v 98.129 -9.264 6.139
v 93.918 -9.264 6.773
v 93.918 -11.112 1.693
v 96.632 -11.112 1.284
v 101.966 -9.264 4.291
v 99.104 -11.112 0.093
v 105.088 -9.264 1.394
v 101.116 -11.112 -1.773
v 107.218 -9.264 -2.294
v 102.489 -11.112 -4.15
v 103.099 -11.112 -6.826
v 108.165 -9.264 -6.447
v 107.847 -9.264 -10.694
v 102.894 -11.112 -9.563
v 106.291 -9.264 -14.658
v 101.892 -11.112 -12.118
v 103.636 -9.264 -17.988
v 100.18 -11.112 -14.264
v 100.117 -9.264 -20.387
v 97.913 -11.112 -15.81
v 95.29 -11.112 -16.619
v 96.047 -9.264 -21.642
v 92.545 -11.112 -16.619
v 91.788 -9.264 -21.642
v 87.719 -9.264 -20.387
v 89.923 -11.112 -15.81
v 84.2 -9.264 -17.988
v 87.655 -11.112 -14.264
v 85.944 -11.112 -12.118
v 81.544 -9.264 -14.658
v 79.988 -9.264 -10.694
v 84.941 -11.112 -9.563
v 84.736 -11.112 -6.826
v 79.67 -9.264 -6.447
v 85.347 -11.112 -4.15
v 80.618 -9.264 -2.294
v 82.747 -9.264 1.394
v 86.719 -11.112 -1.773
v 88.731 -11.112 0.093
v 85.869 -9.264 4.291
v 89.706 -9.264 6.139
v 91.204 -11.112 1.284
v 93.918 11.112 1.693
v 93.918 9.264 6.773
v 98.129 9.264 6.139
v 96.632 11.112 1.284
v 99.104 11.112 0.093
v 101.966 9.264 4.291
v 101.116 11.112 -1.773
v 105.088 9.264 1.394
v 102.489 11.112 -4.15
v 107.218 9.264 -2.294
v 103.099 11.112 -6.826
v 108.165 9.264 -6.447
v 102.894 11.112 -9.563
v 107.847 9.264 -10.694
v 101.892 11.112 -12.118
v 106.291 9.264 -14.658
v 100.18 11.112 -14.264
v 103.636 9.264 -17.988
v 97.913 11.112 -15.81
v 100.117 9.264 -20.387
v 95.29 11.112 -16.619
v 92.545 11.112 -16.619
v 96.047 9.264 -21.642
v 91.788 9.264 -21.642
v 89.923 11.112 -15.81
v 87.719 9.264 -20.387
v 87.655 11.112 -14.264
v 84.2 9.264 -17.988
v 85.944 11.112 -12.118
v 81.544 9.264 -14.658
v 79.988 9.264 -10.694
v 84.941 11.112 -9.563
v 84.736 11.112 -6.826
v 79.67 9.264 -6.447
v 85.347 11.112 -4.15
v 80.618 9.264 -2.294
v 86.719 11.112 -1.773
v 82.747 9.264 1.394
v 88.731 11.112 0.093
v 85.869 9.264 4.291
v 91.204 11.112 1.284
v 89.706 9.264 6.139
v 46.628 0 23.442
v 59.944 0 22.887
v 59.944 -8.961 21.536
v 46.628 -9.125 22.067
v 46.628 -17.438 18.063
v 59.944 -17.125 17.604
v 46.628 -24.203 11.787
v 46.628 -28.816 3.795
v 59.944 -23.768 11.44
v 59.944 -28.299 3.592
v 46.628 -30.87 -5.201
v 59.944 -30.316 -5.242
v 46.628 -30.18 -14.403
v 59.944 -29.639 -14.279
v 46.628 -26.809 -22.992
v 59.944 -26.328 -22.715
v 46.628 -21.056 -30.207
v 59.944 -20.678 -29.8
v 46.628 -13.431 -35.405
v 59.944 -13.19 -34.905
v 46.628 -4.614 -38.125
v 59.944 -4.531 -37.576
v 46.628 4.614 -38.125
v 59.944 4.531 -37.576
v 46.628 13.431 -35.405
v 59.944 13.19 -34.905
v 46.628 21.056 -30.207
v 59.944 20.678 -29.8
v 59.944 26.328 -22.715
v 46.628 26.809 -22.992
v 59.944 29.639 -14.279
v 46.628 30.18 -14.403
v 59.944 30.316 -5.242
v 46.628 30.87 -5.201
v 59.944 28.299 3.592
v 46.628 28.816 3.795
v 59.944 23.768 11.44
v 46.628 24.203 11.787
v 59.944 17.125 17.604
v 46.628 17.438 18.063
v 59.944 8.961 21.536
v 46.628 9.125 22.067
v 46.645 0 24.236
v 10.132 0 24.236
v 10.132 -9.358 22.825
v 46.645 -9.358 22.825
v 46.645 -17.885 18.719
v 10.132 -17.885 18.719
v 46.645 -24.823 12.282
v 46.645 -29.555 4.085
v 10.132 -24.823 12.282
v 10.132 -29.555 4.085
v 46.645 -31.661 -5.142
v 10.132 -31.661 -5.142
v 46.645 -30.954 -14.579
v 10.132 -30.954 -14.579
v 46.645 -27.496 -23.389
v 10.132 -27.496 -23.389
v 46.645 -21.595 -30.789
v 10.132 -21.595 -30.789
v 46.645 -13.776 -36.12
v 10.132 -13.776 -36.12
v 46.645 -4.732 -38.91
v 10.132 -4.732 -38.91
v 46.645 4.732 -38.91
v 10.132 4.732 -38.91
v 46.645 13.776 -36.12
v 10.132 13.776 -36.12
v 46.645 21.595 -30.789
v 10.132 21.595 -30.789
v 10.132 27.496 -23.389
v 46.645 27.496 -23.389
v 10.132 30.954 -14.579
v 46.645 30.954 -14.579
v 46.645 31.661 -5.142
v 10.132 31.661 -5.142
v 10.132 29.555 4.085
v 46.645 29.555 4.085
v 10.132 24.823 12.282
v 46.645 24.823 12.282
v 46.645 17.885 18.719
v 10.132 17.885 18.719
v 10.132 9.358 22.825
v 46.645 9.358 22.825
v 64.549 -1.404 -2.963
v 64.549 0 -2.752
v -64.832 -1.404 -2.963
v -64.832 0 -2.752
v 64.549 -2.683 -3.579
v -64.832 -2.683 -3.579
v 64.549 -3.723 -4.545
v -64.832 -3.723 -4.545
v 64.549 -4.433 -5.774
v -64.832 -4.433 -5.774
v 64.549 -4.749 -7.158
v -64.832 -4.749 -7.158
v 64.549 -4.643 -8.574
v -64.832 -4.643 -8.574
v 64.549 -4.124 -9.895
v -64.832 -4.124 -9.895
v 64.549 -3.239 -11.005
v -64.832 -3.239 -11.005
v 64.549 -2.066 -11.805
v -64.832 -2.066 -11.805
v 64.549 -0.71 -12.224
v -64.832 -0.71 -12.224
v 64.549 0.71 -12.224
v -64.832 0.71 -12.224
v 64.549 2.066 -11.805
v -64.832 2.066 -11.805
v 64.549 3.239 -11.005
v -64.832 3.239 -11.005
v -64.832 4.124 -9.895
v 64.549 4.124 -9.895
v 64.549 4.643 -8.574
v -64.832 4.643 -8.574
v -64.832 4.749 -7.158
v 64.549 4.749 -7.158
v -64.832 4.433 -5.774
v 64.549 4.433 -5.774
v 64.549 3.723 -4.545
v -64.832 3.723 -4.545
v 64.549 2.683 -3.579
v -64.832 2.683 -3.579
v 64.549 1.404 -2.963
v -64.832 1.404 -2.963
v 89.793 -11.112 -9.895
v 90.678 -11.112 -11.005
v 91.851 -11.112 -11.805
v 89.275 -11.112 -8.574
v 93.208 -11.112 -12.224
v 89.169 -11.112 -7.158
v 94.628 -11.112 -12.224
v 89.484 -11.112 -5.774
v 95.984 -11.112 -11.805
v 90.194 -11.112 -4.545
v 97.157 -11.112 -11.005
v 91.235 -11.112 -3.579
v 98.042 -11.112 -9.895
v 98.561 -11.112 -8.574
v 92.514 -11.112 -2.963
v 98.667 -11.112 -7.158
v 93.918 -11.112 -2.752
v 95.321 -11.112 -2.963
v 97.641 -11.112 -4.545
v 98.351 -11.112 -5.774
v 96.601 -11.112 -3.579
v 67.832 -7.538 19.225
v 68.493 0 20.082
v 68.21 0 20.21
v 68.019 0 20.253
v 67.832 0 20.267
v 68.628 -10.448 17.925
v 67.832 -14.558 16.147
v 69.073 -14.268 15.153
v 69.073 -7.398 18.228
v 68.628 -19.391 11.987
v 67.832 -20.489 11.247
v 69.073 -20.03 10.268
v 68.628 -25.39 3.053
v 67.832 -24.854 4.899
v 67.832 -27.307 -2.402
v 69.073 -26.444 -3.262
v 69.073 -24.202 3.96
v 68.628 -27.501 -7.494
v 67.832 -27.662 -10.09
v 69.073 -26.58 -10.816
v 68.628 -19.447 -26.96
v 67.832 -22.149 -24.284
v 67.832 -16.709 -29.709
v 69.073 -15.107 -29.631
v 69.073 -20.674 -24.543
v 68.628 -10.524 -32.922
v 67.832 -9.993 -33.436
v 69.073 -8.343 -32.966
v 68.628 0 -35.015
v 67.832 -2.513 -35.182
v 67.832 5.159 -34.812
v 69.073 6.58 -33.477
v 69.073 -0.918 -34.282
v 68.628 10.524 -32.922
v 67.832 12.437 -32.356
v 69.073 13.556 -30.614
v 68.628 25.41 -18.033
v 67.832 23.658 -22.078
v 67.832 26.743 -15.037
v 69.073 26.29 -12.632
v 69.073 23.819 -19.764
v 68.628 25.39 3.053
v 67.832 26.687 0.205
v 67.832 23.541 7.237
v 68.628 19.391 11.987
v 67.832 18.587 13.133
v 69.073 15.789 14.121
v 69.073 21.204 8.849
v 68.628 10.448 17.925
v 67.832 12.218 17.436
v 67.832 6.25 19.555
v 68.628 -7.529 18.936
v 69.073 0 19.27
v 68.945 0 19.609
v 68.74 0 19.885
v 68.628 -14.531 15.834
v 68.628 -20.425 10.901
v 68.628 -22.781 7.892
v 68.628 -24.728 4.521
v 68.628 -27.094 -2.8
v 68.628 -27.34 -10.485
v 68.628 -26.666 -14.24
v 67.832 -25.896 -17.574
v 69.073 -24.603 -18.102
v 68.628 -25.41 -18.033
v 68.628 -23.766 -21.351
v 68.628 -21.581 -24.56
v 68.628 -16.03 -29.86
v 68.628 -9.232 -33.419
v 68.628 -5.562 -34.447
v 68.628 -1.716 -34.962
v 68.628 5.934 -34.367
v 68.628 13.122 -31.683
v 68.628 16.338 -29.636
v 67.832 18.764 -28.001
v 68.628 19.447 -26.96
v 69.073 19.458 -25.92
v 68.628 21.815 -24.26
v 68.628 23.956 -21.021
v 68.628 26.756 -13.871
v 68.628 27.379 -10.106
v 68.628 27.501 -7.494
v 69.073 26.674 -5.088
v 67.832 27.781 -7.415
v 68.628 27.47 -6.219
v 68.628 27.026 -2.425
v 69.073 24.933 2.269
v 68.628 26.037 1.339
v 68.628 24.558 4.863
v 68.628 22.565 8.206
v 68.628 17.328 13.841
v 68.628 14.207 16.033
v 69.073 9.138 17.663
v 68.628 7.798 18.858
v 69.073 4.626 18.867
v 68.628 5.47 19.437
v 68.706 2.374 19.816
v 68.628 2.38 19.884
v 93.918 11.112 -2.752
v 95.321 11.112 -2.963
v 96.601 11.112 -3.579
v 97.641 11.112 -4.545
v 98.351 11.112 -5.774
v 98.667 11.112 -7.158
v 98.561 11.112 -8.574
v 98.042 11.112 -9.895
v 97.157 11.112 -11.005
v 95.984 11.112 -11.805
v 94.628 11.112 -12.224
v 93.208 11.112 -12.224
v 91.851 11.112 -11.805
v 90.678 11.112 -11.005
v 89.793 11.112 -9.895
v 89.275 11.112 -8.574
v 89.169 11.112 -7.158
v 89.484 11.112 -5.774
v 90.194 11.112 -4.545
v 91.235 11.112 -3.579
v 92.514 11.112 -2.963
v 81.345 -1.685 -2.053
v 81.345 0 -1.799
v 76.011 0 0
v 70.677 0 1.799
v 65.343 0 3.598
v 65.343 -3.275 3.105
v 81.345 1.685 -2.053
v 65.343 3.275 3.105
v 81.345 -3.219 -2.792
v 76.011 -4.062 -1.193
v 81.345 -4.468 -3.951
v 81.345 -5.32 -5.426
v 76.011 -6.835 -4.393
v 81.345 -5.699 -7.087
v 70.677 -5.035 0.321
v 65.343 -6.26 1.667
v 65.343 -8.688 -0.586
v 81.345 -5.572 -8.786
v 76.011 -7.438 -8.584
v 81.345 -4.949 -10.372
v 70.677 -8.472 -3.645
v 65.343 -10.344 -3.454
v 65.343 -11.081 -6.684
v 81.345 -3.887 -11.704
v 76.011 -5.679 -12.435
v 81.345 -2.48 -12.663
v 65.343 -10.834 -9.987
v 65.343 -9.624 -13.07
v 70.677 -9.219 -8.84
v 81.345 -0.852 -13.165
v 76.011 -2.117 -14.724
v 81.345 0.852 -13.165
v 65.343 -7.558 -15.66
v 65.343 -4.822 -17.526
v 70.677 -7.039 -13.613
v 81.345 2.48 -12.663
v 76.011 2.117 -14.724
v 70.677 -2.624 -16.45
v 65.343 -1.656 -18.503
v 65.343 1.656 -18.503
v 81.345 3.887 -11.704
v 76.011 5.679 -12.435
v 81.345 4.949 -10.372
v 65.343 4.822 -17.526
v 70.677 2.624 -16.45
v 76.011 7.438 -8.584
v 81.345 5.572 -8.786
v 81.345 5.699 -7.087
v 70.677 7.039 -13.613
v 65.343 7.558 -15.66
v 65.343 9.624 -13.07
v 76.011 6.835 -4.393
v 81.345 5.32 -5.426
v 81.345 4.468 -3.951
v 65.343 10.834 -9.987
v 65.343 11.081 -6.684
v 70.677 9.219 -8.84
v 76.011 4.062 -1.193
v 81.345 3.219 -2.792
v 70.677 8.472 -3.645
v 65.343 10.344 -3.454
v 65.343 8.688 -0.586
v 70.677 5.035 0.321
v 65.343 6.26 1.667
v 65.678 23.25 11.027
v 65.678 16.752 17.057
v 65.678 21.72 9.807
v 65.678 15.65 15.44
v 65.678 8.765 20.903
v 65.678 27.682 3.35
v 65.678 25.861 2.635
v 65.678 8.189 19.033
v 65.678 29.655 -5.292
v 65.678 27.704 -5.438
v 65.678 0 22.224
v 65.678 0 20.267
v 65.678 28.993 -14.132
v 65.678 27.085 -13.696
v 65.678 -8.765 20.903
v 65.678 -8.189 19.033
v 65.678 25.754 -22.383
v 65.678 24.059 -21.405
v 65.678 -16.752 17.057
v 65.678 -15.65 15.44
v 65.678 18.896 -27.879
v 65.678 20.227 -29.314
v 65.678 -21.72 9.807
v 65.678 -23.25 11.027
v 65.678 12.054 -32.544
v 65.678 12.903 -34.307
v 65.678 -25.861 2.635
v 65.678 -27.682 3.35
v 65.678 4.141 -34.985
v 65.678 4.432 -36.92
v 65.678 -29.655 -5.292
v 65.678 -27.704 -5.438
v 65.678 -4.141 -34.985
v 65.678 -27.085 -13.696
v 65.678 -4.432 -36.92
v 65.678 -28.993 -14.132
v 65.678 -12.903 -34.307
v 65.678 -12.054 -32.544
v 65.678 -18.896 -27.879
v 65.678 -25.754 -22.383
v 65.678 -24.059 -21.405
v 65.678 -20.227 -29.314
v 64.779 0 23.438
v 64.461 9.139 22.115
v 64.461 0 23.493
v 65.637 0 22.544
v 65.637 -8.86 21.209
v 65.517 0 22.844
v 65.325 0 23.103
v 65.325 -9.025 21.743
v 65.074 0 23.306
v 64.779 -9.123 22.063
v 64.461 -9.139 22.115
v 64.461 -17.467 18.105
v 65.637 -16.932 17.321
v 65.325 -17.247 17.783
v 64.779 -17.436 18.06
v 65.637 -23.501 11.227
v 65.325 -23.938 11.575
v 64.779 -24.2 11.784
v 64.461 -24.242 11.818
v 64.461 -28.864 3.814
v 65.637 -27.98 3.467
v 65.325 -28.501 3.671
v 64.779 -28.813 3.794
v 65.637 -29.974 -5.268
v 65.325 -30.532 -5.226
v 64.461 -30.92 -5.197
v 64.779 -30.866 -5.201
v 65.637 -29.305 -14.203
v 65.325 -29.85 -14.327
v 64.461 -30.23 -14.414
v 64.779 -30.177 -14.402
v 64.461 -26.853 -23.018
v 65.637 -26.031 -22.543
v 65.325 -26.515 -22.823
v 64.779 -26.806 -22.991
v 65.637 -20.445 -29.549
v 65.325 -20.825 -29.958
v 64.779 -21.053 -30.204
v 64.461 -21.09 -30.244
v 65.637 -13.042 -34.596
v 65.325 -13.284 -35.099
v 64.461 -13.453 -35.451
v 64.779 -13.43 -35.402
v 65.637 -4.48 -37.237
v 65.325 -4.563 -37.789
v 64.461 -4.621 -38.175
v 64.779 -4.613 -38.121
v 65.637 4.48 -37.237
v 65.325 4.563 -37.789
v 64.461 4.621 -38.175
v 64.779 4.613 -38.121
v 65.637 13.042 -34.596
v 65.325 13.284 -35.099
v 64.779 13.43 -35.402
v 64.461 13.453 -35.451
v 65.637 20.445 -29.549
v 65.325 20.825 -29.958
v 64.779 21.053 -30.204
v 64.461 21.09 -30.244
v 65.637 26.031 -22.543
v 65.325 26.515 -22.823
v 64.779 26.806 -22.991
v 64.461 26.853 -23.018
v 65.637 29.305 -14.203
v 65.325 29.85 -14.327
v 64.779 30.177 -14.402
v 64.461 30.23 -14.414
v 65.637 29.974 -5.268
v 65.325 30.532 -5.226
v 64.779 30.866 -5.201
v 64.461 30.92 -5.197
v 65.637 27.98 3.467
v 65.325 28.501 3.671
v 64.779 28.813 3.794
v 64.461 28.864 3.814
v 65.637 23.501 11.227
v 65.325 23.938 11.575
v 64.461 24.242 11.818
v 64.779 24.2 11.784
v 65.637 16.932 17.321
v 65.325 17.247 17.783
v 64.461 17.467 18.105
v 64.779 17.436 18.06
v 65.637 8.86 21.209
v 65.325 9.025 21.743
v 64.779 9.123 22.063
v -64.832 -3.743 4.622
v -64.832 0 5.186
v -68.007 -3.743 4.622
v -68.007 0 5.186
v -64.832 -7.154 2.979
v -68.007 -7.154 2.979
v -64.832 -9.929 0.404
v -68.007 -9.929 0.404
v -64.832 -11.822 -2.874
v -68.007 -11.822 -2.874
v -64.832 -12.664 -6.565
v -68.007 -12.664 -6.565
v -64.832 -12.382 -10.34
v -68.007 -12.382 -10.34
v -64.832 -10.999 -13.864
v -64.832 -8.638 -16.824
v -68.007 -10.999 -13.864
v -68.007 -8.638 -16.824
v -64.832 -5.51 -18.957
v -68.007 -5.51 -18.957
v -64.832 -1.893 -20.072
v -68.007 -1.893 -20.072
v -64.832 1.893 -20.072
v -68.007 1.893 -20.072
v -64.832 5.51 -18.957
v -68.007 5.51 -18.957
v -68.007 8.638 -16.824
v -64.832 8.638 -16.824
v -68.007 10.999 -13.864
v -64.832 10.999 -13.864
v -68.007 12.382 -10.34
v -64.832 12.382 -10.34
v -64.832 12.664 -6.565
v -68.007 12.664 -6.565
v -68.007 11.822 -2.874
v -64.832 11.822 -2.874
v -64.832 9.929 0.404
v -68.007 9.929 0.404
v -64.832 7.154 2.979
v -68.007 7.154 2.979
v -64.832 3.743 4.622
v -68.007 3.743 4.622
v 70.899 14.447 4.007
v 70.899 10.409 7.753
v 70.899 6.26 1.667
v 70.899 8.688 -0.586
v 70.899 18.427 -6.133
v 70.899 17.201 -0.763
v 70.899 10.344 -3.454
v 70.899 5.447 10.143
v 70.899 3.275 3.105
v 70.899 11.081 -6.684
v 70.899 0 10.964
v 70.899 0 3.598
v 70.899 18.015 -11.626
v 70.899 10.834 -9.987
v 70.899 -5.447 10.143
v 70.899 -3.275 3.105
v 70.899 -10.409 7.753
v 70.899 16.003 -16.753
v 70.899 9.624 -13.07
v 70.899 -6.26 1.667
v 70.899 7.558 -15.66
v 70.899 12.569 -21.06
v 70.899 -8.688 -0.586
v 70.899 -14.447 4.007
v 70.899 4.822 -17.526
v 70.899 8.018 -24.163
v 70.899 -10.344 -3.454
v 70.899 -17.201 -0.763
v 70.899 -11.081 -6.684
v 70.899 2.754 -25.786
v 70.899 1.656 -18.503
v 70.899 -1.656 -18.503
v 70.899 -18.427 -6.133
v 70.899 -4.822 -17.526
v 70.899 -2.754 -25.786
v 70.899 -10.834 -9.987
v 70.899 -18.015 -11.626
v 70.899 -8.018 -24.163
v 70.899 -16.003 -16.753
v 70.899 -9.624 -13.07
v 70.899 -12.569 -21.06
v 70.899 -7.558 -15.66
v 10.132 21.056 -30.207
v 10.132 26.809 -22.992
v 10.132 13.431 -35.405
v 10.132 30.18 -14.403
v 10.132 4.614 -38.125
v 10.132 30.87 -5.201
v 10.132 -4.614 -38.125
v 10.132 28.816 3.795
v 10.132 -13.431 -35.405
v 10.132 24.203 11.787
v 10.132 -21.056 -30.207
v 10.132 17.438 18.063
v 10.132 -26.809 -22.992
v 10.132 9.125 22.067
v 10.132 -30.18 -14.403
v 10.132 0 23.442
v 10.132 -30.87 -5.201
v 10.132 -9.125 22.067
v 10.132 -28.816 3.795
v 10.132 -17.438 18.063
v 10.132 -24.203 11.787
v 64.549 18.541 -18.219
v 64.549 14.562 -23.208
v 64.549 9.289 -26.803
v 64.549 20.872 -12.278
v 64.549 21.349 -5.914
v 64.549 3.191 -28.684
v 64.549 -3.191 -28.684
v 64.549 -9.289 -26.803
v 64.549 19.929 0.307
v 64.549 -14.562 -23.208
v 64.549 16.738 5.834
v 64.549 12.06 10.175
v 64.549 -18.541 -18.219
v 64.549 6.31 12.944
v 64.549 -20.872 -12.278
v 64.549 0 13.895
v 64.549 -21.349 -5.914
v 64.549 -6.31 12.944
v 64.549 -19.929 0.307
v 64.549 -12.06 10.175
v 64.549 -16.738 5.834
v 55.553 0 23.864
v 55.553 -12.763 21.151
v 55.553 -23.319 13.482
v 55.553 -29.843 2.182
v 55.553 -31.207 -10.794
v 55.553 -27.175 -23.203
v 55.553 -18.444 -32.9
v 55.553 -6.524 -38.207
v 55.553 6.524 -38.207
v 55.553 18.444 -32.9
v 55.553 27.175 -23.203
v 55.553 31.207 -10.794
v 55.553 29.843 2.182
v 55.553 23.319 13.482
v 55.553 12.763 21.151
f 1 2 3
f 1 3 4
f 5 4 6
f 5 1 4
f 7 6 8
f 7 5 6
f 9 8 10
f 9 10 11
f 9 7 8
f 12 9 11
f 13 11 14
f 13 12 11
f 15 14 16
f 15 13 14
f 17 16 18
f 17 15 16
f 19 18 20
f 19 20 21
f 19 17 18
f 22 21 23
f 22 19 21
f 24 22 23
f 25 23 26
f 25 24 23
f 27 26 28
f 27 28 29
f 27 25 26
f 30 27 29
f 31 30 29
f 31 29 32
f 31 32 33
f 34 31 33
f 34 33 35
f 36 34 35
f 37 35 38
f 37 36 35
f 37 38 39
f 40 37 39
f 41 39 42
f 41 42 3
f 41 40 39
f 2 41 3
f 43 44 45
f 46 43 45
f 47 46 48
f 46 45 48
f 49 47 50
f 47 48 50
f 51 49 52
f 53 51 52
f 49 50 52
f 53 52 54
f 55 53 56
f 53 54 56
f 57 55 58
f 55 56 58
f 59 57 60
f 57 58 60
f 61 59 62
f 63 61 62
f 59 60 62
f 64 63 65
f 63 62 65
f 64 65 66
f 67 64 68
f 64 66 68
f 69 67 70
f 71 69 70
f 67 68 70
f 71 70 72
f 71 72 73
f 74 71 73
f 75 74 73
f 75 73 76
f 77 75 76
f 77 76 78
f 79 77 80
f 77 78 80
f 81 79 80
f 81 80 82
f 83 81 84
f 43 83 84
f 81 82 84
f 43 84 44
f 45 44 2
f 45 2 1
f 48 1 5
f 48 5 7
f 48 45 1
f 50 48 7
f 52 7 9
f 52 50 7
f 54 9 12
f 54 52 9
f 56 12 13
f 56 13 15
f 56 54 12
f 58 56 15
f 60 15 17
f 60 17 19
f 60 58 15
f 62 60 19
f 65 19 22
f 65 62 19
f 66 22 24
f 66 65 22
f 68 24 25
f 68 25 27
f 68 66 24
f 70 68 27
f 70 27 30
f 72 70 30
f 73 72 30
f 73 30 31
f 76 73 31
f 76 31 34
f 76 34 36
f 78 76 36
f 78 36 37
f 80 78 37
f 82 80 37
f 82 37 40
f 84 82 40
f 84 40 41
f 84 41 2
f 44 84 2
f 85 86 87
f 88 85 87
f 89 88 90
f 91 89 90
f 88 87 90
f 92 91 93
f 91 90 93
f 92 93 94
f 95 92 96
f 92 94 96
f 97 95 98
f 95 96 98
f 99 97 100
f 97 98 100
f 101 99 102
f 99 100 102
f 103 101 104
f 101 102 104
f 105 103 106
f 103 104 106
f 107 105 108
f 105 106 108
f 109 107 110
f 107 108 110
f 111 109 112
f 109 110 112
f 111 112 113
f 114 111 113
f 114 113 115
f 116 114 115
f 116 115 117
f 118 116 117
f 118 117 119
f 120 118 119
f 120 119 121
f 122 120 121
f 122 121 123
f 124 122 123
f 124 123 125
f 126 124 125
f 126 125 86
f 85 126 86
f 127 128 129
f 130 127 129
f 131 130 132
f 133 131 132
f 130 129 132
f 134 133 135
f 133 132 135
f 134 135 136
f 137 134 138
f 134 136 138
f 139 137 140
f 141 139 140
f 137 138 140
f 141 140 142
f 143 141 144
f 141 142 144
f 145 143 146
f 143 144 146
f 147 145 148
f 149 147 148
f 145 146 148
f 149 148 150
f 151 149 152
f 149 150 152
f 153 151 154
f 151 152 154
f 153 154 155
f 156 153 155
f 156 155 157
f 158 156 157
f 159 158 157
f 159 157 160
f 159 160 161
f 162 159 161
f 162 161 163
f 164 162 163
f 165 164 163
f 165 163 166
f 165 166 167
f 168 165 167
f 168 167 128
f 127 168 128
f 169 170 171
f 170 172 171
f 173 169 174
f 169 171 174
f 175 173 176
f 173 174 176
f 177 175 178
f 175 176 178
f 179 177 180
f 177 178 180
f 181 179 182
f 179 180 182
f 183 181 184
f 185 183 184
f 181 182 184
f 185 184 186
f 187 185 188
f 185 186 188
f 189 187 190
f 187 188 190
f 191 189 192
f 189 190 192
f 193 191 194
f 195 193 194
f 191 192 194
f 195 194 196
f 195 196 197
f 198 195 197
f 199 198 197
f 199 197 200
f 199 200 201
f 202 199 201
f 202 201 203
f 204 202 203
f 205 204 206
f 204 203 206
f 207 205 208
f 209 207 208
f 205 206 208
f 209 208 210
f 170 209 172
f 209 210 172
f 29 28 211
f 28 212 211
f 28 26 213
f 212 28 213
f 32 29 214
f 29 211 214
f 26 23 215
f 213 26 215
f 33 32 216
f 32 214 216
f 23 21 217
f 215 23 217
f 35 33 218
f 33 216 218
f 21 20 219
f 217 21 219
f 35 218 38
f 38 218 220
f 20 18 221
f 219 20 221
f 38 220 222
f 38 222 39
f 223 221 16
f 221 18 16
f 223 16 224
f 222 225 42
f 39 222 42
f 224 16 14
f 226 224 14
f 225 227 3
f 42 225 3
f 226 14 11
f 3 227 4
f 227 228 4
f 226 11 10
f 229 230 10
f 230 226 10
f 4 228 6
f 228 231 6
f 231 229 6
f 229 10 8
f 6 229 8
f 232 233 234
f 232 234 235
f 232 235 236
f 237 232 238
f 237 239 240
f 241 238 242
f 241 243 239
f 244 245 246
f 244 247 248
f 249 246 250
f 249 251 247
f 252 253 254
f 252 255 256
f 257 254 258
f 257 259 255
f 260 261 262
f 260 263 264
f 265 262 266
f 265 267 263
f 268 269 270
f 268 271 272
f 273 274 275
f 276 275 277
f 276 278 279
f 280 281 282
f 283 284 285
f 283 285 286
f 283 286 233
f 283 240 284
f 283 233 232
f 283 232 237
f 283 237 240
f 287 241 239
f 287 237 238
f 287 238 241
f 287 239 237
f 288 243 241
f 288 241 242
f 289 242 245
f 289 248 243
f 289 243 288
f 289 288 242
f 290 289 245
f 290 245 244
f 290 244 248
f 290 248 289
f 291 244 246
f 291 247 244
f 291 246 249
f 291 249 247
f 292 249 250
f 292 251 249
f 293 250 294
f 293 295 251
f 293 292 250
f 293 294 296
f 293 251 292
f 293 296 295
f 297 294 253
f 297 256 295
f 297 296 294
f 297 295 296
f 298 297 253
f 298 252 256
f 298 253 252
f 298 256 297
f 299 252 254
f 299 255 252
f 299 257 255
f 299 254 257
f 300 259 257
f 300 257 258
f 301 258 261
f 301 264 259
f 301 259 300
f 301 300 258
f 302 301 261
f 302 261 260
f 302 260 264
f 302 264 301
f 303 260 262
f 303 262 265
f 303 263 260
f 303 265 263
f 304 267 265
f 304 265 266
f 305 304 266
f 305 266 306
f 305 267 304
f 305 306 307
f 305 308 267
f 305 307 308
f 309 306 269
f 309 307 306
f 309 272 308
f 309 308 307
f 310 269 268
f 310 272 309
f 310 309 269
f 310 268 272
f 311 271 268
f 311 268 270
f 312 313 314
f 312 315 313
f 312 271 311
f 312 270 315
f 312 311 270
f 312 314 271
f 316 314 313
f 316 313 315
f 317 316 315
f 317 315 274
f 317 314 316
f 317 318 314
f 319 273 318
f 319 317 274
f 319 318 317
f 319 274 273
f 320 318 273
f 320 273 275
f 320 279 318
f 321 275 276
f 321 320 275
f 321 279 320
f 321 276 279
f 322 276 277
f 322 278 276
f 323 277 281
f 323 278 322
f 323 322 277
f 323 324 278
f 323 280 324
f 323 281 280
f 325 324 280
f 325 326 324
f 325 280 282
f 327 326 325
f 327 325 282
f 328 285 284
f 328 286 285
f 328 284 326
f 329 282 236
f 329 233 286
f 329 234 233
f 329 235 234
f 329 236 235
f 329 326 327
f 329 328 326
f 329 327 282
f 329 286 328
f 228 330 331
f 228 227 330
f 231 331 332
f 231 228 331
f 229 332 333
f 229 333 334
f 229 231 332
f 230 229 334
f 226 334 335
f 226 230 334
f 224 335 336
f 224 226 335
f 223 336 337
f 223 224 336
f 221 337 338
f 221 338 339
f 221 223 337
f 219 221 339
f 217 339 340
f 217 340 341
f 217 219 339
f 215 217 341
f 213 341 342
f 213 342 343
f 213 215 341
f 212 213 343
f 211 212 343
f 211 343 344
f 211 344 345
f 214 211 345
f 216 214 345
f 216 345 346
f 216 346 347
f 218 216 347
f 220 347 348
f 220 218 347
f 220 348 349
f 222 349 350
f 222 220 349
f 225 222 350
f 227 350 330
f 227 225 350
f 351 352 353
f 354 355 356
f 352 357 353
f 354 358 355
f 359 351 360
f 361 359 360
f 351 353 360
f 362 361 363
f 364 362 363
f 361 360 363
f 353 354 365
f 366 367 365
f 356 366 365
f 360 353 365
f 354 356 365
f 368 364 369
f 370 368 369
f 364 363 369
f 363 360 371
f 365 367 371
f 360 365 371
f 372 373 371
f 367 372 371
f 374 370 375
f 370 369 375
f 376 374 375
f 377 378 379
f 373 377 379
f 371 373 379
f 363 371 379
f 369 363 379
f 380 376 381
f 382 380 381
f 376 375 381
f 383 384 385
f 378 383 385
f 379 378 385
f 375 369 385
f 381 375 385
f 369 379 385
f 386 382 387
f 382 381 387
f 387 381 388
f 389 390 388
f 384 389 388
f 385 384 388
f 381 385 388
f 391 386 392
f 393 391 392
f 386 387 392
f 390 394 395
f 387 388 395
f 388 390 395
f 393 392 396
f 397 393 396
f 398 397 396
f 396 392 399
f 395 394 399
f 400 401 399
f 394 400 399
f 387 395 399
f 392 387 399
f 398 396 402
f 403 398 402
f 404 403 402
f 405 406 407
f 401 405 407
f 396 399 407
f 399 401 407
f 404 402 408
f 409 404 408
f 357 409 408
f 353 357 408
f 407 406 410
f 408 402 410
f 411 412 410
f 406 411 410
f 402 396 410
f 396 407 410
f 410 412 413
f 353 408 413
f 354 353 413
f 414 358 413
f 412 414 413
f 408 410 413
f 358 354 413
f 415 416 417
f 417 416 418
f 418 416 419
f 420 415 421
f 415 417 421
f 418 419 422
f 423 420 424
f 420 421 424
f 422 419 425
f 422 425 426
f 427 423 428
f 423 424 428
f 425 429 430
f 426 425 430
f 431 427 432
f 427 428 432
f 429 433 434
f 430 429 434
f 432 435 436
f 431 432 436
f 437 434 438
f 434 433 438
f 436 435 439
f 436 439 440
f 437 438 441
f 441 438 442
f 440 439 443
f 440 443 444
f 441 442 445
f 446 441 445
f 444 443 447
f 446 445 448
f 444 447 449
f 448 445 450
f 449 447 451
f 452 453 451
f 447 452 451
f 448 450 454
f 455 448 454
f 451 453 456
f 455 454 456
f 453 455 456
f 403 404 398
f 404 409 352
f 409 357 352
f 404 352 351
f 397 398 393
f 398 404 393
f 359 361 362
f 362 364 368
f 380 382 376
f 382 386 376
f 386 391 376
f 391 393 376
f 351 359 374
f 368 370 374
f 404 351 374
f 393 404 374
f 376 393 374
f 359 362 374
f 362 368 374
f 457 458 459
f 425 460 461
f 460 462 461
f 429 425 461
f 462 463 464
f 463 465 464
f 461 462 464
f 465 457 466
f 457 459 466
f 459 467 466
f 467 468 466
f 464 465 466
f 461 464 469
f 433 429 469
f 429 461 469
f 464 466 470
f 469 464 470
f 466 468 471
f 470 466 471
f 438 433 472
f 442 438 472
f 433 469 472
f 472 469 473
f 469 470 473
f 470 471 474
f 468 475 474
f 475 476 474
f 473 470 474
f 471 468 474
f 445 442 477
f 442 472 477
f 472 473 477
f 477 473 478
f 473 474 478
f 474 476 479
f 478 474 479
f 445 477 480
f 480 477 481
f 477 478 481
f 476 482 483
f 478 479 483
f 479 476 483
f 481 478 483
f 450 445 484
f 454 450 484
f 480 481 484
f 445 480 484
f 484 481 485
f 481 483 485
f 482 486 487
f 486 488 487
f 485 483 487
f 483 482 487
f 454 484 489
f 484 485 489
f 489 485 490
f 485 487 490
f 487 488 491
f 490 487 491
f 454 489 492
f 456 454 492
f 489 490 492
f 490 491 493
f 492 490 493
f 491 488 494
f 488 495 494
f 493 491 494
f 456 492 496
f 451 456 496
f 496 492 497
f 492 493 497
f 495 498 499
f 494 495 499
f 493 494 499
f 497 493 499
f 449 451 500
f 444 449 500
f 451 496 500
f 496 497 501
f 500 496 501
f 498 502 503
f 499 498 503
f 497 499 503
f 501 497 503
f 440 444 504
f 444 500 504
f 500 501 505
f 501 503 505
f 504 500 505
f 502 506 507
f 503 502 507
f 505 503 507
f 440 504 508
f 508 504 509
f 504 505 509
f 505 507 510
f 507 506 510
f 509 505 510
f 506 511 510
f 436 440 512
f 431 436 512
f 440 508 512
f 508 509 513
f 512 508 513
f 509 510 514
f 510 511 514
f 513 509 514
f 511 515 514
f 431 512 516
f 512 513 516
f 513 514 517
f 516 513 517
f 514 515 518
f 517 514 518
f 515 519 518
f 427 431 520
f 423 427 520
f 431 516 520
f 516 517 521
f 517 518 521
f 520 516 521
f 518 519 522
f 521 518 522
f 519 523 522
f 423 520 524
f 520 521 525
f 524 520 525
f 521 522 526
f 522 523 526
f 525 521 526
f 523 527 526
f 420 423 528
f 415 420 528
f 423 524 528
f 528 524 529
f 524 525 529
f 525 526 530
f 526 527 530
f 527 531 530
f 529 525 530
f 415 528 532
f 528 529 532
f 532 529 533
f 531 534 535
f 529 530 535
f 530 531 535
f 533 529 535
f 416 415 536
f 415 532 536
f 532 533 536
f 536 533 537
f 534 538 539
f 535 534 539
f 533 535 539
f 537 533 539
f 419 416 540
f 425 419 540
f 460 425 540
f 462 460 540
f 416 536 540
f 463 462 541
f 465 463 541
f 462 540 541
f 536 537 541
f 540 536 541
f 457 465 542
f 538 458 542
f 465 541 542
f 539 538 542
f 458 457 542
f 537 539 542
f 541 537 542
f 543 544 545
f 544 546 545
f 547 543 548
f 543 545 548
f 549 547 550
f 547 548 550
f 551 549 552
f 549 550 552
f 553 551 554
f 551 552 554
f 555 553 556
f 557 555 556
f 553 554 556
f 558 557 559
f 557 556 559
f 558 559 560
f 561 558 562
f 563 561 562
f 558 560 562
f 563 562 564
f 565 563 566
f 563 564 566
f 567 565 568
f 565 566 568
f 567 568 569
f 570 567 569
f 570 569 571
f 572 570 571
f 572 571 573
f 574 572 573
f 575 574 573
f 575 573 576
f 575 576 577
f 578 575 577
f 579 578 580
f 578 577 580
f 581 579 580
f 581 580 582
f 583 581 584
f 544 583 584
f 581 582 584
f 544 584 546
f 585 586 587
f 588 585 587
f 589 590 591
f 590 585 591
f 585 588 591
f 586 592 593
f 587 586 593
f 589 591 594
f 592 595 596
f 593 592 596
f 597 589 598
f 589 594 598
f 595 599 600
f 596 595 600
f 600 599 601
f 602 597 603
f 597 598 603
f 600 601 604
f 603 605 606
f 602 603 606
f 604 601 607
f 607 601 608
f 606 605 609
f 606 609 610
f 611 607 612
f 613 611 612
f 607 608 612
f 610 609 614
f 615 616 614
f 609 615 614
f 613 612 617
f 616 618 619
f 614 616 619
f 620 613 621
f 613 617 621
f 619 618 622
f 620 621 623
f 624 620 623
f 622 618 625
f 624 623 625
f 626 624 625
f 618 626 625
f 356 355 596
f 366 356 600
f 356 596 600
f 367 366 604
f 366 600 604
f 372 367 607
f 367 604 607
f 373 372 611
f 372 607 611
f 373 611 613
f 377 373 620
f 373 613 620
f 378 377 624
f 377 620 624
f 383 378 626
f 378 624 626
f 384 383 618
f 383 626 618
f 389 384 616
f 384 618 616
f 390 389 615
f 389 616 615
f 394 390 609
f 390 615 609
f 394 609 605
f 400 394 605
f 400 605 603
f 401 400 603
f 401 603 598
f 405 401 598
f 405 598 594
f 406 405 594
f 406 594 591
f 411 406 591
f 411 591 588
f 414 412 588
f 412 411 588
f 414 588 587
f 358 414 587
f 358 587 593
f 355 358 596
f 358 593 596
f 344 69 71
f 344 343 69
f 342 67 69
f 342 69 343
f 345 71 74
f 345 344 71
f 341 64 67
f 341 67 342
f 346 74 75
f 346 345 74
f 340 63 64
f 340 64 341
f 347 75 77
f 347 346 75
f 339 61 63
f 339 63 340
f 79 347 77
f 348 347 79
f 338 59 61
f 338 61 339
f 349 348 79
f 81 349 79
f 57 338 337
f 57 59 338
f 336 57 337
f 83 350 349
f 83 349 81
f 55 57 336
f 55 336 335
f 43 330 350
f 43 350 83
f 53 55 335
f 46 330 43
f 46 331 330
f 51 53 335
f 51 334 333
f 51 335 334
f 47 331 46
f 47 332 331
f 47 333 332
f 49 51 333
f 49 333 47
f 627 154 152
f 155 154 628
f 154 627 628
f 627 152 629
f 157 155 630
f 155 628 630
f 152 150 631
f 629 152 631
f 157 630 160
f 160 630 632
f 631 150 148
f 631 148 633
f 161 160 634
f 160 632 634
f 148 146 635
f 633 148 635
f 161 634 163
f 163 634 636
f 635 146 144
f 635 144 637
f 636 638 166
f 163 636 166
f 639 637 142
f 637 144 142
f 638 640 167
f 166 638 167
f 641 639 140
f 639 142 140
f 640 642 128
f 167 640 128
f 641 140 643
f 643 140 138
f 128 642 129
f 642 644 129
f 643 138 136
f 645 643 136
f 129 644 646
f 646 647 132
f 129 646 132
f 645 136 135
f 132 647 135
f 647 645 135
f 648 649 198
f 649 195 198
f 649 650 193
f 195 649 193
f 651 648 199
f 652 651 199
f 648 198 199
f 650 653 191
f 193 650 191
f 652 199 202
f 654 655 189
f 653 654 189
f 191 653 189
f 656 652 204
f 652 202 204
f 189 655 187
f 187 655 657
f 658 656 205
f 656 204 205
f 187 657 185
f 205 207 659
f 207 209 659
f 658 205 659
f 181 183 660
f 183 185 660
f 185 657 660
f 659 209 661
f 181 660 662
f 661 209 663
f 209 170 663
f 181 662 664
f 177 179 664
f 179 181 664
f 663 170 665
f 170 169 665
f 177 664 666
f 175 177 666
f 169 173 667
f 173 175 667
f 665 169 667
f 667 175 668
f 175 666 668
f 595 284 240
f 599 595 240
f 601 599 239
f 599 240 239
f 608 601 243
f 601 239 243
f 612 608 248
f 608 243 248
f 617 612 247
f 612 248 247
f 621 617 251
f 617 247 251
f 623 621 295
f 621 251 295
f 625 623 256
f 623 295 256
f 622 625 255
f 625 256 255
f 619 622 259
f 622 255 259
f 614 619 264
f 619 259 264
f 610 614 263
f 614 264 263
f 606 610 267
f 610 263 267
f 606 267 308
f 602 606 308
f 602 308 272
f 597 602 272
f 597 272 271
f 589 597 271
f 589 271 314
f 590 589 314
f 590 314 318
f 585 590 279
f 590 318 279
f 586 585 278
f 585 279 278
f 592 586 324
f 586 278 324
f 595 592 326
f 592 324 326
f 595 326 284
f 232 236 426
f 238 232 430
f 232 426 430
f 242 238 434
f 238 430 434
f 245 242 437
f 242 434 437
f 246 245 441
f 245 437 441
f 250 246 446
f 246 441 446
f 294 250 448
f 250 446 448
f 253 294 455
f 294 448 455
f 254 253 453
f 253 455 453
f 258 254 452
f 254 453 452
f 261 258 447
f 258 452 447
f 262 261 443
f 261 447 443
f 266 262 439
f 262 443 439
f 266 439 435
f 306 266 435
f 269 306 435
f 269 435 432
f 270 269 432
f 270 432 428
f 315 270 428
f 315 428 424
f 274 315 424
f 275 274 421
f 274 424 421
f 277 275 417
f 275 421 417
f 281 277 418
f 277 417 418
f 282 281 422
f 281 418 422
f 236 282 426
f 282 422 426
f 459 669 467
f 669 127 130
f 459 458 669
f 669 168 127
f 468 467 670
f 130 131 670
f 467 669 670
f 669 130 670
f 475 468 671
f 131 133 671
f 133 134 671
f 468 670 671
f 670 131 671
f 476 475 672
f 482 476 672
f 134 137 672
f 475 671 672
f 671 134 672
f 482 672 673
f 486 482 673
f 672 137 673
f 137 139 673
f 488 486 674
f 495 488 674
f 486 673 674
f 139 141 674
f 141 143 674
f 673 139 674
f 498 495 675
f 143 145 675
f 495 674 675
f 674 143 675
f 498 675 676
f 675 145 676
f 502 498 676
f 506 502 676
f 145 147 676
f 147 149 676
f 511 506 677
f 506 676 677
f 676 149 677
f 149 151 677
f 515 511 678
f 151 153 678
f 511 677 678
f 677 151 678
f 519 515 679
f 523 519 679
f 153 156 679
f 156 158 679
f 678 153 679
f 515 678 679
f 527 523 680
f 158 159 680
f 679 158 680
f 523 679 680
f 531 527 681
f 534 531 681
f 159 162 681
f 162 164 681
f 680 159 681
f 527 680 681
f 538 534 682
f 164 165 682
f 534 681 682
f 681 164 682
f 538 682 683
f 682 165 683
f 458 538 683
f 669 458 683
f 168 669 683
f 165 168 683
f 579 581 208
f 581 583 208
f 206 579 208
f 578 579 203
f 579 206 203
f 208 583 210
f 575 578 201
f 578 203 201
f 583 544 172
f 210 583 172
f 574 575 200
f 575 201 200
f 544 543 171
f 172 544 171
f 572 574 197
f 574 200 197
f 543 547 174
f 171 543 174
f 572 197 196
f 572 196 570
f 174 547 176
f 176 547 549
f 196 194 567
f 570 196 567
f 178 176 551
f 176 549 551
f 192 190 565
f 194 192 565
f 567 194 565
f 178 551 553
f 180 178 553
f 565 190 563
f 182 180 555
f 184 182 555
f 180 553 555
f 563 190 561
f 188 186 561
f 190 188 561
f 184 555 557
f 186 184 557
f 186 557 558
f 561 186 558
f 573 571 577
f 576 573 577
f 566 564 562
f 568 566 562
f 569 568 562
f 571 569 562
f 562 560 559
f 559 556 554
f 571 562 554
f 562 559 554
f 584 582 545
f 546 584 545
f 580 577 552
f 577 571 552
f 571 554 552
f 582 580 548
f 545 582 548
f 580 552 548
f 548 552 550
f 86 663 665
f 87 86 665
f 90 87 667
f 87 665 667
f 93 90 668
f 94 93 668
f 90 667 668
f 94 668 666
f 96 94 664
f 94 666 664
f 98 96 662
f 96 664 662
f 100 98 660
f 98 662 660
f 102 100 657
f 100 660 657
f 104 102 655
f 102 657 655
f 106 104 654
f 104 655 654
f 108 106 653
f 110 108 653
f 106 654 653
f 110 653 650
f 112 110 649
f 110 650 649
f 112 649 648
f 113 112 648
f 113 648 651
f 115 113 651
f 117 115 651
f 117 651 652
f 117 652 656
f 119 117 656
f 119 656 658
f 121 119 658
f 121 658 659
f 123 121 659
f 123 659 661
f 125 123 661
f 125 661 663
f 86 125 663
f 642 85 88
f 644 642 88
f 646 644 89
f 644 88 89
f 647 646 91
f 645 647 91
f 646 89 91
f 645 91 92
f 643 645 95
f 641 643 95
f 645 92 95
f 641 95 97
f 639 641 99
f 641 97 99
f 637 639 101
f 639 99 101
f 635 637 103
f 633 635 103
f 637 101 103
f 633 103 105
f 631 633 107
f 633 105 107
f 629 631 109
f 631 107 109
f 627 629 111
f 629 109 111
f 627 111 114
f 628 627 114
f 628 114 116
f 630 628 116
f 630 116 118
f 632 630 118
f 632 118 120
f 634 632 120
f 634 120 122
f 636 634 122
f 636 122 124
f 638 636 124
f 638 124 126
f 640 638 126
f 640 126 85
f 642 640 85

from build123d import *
from OCP.BRepFilletAPI import BRepFilletAPI_MakeChamfer

# Parameters (mm, degrees)
SKETCH2_R           = 14.2875
SKETCH2_R_2         = 4.7625
BOSS_EXTRUDE1_DEPTH = 11.1125
CHAMFER1_SIZE       = 5.08
CHAMFER1_SIZE2      = 1.84896879
FILLET1_R           = 1.27


with BuildPart() as part:
    # Sketch1 → Revolve1 (revolve)
    with BuildSketch(Plane(origin=(0, 0, 0), x_dir=(1, 0, 0), z_dir=(0, 1, 0)), mode=Mode.PRIVATE) as revolve1_sk:
        Polygon((-68.007276158, 20.214239498), (-68.007276158, 7.514239498), (81.344723842, 7.514239498), (81.344723842, 13.229239498), (65.342723842, 18.626739498), (65.342723842, 12.276739498), (-64.832276158, 12.276739498), (-64.832276158, 20.214239498), align=None)
    revolve(revolve1_sk.sketch.rotate(Axis((-68.007276158, 0, -7.514239498), (1, 0, 0)), 180), axis=Axis((-68.007276158, 0, -7.514239498), (1, 0, 0)))

    # Sketch3 → Revolve2 (revolve)
    with BuildSketch(Plane(origin=(0, 0, 0), x_dir=(1, 0, 0), z_dir=(0, 1, 0)), mode=Mode.PRIVATE) as revolve2_sk:
        Polygon((65.342723842, 12.276739498), (65.342723842, 18.626739498), (70.898973842, 18.626739498), (70.898973842, 25.992739498), (68.853376756, 35.295489498), (65.678376756, 35.295489498), (65.678376756, 38.470489498), (46.644920398, 39.264239498), (10.132420398, 39.264239498), (10.132420398, 38.470489498), (46.628376756, 38.470489498), (59.943625033, 37.915205259), (64.548973842, 28.923216622), (64.548973842, 12.276739498), align=None)
        Polygon((64.548973842, 2.751739498), (65.342723842, 2.751739498), (65.342723842, -3.598260502), (70.898973842, -3.598260502), (70.898973842, -10.964260502), (68.853376756, -20.267010502), (65.678376756, -20.267010502), (65.678376756, -23.442010502), (46.644920398, -24.235760502), (10.132420398, -24.235760502), (10.132420398, -23.442010502), (46.628376756, -23.442010502), (59.943625033, -22.886726264), (64.548973842, -13.894737626), align=None)
    revolve(revolve2_sk.sketch.rotate(Axis((-68.086651194, 0, -7.514239498), (1, 0, 0)), 180), axis=Axis((-68.086651194, 0, -7.514239498), (1, 0, 0)))

    # Fillet1
    fillet1_edges = [part.edges().sort_by_distance(p)[0] for p in [
        (68.853376756, 0, -35.295489498),
        (65.678376756, 0, -38.470489498),
        (46.644920398, 0, -39.264239498),
    ]]
    fillet(fillet1_edges, radius=FILLET1_R)


with BuildPart() as body_2:
    # Sketch2 → Boss-Extrude1 (new, symmetric)
    with BuildSketch(Plane(origin=(0, 0, 0), x_dir=(1, 0, 0), z_dir=(0, 1, 0))):
        with Locations(Location((93.917723842, 7.514239498, 0), (0, 0, 270))):
            Circle(SKETCH2_R)
        with Locations(Location((93.917723842, 7.514239498, 0), (0, 0, 270))):
            Circle(SKETCH2_R_2, mode=Mode.SUBTRACT)
    extrude(amount=BOSS_EXTRUDE1_DEPTH, both=True)

    # Chamfer1: one chamfer whose edges measure the first distance from different faces: ONE call of the kernel's chamfer builder (chamfer() names one face for all edges)
    chamfer1_edges_1 = [body_2.edges().sort_by_distance(p)[0] for p in [
        (93.917723842, -11.1125, -21.801739498),
    ]]
    chamfer1_side_1 = [body_2.faces().sort_by_distance(p)[0] for p in [
        (93.917723842, -11.1125, -21.397627972),
    ]]
    chamfer1_edges_2 = [body_2.edges().sort_by_distance(p)[0] for p in [
        (93.917723842, 11.1125, -21.801739498),
    ]]
    chamfer1_side_2 = [body_2.faces().sort_by_distance(p)[0] for p in [
        (93.917723842, 11.1125, -21.397627972),
    ]]
    chamfer1 = BRepFilletAPI_MakeChamfer(body_2.part.solid().wrapped)
    for e in chamfer1_edges_1:
        chamfer1.Add(CHAMFER1_SIZE, CHAMFER1_SIZE2, e.wrapped, chamfer1_side_1[0].wrapped)  # the first distance lies on this face
    for e in chamfer1_edges_2:
        chamfer1.Add(CHAMFER1_SIZE, CHAMFER1_SIZE2, e.wrapped, chamfer1_side_2[0].wrapped)  # the first distance lies on this face
    add(Compound.cast(chamfer1.Shape()), mode=Mode.REPLACE)


solid = Compound([part.part, body_2.part])
